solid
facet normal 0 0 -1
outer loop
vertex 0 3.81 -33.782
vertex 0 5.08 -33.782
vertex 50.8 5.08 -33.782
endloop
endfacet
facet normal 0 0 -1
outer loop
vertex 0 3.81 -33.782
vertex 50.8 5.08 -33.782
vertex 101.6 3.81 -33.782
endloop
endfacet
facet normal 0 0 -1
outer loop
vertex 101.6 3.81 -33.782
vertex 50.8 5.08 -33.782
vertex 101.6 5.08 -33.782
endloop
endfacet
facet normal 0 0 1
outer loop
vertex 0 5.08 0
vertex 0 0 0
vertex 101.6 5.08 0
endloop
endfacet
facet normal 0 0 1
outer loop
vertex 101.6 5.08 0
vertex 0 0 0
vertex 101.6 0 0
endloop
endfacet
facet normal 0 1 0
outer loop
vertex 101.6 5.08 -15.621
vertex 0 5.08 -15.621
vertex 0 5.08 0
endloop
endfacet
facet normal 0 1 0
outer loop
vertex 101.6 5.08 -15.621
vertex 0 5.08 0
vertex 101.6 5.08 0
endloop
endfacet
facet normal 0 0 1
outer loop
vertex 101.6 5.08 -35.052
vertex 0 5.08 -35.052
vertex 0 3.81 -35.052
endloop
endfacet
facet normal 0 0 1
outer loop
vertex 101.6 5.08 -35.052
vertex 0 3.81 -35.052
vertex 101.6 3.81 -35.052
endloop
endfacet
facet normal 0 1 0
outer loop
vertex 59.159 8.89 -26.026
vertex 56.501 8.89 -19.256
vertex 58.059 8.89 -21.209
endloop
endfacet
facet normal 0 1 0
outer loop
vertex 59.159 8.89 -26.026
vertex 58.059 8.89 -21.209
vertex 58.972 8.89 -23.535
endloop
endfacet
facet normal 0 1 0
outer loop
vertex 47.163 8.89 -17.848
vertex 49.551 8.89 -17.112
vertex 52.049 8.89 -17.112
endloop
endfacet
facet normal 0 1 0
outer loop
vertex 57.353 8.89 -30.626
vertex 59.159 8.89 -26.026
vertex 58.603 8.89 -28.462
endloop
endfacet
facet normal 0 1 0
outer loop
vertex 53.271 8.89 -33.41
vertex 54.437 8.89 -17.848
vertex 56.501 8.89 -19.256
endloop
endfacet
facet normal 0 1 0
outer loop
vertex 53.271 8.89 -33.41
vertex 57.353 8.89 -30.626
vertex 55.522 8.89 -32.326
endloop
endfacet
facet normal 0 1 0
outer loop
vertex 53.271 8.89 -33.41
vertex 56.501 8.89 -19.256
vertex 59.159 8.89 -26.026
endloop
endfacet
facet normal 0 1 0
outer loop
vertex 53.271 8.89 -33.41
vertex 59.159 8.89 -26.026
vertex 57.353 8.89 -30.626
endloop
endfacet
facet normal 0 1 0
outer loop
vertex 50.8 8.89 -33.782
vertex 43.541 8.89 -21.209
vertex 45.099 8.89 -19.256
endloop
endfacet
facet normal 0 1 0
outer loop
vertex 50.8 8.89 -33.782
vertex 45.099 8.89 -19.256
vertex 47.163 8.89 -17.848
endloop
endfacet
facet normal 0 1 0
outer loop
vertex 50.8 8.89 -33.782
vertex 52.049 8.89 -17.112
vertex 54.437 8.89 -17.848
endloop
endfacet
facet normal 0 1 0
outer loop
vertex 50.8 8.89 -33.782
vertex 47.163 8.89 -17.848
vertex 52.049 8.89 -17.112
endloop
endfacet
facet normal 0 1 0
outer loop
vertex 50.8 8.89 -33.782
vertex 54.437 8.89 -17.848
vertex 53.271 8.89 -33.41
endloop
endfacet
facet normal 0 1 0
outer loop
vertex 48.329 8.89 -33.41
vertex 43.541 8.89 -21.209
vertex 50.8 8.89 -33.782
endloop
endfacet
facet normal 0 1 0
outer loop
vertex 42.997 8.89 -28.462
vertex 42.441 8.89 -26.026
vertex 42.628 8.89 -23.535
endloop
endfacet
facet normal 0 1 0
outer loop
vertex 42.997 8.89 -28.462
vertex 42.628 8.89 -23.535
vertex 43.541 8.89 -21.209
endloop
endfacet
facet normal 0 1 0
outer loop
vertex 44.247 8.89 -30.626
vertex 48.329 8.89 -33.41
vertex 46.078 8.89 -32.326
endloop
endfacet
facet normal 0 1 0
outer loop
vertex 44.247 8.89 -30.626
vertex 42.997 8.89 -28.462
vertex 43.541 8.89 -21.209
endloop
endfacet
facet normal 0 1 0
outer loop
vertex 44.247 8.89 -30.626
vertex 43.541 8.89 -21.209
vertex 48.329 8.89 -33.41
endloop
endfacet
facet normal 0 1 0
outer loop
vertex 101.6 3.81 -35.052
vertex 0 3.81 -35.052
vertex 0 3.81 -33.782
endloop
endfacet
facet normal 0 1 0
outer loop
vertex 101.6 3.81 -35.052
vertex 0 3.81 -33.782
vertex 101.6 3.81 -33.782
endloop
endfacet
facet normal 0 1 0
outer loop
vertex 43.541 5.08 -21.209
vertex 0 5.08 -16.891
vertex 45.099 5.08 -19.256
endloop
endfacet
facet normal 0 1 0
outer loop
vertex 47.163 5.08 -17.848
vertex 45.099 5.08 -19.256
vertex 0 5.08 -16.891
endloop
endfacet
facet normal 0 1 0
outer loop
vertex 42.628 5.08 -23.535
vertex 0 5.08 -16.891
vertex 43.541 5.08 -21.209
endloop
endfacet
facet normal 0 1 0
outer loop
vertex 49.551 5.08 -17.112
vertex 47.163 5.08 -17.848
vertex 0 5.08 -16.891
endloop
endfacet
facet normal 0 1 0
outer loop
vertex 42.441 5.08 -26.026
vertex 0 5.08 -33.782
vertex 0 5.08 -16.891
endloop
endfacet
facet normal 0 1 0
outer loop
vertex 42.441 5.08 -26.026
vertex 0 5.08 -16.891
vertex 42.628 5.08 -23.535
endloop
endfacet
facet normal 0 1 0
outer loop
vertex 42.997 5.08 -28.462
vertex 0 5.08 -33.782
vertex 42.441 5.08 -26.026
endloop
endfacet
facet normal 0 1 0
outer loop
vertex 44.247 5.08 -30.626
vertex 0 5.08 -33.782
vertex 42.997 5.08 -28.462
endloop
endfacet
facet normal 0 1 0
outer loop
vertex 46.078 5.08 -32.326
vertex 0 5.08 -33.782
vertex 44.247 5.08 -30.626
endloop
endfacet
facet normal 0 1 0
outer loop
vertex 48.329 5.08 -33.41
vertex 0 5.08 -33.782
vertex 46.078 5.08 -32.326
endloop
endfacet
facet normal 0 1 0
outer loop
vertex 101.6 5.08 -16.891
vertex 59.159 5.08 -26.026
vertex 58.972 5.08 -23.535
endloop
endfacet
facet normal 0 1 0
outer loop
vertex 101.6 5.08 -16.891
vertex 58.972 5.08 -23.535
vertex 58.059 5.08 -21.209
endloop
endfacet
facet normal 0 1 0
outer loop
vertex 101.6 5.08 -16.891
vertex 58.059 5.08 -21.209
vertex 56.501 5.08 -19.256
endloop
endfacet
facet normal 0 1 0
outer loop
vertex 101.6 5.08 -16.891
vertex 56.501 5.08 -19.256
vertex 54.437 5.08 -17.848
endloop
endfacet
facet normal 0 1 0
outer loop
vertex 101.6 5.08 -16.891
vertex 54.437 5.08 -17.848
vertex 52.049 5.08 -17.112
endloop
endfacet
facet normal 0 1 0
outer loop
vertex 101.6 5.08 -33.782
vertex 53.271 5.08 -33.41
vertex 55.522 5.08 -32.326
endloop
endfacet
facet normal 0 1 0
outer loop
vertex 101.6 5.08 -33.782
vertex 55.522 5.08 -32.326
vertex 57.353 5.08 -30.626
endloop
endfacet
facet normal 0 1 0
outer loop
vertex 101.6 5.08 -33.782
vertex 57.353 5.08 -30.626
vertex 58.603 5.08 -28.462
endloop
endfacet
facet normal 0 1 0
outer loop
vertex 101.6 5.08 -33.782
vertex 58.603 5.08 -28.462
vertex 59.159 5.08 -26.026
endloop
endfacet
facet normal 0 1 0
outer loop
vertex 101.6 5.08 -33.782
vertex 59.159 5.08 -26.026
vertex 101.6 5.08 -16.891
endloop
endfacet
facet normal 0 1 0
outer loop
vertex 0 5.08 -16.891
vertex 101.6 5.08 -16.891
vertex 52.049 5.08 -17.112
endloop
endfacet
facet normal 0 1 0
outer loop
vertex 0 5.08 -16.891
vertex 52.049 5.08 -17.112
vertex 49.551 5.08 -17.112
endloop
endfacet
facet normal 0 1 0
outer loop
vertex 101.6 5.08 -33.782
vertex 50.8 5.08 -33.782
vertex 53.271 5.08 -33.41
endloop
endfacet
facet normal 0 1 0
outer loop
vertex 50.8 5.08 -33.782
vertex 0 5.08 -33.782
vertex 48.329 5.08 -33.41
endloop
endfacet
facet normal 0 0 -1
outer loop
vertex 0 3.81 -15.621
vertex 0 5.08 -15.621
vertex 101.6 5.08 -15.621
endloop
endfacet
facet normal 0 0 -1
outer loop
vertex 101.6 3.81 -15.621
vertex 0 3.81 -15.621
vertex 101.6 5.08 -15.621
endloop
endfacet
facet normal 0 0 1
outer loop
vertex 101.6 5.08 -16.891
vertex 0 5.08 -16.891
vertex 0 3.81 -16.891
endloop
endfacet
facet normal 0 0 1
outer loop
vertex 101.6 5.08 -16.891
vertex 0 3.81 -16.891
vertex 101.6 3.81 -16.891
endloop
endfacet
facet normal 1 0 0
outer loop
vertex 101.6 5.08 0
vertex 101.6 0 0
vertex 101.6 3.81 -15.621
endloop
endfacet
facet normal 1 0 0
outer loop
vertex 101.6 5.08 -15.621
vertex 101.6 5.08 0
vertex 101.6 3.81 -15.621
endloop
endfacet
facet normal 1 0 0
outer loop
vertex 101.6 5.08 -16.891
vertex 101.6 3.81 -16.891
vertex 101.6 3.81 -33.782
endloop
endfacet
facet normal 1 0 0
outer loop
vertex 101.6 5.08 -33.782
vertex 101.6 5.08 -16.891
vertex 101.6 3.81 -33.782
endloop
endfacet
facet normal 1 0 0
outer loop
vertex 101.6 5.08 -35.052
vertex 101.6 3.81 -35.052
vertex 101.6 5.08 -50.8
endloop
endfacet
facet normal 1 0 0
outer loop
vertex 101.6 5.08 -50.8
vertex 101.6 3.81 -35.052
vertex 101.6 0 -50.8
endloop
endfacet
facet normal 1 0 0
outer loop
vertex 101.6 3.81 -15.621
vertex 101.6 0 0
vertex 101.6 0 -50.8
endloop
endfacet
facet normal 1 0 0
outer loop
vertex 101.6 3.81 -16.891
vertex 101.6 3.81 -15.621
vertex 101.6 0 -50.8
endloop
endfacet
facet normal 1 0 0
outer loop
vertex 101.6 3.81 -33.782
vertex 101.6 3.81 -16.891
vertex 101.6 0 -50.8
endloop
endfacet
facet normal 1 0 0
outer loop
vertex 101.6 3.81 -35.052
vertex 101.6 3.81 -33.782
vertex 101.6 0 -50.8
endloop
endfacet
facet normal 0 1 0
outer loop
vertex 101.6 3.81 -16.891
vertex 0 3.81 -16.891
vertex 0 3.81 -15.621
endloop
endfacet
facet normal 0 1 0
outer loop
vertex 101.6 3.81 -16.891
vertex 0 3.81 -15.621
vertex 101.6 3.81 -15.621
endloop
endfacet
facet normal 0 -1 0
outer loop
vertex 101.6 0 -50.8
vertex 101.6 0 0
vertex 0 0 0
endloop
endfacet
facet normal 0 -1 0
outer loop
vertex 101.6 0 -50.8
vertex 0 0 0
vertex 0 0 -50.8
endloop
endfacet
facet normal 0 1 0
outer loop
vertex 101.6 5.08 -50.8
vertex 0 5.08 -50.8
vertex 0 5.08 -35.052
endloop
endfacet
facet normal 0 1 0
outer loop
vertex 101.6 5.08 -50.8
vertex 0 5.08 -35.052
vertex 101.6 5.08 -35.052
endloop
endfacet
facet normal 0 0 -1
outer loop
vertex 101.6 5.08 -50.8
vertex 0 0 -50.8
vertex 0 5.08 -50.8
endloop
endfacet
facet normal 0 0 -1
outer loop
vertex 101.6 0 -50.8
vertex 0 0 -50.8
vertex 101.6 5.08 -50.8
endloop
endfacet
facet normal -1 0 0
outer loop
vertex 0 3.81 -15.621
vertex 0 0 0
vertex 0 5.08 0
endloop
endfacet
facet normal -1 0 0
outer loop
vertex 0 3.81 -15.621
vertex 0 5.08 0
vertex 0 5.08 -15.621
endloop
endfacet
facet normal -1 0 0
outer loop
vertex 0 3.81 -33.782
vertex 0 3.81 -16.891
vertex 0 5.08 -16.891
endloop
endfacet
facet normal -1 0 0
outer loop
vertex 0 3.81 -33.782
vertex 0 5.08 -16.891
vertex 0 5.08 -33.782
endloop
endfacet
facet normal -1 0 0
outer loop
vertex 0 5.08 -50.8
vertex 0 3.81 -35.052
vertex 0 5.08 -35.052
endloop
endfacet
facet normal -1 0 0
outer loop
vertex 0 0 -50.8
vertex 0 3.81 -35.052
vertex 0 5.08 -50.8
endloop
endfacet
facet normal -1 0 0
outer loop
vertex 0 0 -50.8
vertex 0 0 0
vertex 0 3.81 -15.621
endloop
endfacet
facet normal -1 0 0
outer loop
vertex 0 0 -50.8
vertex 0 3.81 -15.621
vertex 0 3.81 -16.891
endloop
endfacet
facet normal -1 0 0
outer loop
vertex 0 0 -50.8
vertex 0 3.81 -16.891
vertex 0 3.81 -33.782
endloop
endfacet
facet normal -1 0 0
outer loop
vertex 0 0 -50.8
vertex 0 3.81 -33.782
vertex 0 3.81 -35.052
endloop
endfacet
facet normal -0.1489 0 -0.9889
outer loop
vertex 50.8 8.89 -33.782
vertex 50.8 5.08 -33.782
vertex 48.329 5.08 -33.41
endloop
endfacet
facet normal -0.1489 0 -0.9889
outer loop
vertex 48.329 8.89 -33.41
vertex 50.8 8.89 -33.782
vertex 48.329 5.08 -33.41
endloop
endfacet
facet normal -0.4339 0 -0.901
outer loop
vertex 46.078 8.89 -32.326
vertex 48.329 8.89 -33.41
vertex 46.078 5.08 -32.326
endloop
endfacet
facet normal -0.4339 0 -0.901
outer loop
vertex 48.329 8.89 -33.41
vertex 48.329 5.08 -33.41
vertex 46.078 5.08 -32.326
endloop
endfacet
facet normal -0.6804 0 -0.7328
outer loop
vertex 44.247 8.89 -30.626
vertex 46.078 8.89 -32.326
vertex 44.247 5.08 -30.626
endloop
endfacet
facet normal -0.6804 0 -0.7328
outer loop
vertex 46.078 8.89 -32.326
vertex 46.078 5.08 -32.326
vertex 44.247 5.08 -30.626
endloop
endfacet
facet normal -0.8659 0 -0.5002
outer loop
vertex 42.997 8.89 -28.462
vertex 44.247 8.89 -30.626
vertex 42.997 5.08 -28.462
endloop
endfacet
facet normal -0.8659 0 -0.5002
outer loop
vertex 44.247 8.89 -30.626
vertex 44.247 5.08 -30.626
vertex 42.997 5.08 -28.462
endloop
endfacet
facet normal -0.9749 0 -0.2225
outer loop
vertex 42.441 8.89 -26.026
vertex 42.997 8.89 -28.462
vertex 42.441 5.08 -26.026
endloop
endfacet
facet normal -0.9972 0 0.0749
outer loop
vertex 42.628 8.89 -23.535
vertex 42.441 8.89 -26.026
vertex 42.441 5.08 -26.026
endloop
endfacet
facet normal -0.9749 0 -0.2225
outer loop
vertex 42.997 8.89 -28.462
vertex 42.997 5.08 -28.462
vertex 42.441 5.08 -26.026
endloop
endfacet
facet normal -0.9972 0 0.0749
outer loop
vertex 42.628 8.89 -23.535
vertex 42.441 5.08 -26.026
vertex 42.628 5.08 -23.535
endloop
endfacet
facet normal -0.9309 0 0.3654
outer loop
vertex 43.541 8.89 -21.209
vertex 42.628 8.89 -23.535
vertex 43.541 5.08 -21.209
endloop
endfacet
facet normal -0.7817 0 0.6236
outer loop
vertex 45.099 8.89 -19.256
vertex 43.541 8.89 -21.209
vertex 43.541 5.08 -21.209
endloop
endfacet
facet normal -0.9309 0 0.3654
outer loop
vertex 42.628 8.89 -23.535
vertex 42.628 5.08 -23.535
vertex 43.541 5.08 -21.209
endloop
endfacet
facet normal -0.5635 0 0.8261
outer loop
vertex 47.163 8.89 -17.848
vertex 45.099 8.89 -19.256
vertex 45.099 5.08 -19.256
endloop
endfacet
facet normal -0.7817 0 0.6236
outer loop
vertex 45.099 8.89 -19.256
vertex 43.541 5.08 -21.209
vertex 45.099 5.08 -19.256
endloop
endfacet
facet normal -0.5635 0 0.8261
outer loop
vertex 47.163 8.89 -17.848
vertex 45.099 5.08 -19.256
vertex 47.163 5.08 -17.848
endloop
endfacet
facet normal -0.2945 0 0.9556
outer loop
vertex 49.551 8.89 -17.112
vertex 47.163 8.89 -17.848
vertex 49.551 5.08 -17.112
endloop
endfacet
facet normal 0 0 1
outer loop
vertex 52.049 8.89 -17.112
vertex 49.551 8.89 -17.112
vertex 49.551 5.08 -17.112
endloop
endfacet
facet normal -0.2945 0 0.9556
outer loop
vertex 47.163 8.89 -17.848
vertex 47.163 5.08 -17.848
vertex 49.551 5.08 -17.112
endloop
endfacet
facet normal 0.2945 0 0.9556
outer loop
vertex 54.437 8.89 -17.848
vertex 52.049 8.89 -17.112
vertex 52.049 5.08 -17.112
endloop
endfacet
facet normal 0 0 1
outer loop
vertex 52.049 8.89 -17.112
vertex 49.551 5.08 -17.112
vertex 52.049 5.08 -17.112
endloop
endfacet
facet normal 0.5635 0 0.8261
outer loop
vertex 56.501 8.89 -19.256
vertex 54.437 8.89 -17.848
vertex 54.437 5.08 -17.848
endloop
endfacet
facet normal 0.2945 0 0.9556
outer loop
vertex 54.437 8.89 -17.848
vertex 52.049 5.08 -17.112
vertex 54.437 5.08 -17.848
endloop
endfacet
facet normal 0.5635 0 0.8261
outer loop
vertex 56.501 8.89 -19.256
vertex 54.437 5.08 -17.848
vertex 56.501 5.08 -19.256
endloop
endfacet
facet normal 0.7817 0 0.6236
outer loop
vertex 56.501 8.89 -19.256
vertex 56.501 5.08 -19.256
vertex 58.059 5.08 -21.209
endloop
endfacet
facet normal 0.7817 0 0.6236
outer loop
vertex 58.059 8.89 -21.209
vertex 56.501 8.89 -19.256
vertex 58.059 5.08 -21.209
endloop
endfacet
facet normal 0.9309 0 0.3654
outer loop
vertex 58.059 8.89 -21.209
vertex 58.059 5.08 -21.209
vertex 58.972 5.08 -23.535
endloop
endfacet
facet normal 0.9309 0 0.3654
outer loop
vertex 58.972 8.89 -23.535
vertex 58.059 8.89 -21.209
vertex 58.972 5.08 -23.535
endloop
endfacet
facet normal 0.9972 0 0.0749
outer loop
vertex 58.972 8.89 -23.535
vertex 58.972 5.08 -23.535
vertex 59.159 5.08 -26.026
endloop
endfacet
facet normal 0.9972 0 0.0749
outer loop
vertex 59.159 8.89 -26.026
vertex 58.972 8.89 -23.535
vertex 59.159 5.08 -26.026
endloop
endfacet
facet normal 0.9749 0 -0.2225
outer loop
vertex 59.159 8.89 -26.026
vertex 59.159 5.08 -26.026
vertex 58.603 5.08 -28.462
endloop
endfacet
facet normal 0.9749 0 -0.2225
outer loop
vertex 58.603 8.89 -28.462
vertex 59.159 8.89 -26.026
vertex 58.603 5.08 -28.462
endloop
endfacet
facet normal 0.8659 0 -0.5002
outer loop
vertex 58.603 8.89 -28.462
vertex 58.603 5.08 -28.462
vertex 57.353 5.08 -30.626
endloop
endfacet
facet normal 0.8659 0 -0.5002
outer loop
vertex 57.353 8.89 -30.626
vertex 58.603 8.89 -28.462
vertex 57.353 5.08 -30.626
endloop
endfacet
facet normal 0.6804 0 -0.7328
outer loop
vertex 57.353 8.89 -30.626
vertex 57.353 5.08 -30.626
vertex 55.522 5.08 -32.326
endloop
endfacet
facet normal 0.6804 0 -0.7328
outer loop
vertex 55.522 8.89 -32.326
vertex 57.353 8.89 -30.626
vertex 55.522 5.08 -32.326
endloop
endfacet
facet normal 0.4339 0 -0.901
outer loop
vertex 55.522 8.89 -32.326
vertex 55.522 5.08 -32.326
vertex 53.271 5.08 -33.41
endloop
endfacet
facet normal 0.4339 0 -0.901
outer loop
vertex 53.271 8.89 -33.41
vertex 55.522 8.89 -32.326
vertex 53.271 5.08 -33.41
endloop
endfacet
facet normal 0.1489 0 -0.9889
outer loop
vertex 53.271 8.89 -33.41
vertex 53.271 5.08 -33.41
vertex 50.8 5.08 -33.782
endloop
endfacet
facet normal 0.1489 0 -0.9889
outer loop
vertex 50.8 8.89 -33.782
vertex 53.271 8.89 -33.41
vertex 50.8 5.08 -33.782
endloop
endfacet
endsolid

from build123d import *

# Parameters (mm, degrees)
SKETCH1_W           = 101.6
SKETCH1_H           = 50.8
BOSS_EXTRUDE1_DEPTH = 5.08
SKETCH2_R           = 8.382
BOSS_EXTRUDE2_DEPTH = 8.89
SKETCH4_W           = 101.6
SKETCH4_H           = 1.27
CUT_EXTRUDE1_DEPTH  = 1.27
SKETCH5_W           = 101.6
SKETCH5_H           = 1.27
CUT_EXTRUDE2_DEPTH  = 1.27


with BuildPart() as part:
    # Sketch1 → Boss-Extrude1 (new body)
    with BuildSketch(Plane(origin=(0, 0, 0), x_dir=(1, 0, 0), z_dir=(0, 1, 0))):
        with Locations((50.8, 25.4)):
            Rectangle(SKETCH1_W, SKETCH1_H)
    extrude(amount=BOSS_EXTRUDE1_DEPTH)

    # Sketch2 → Boss-Extrude2 (add)
    with BuildSketch(Plane(origin=(0, 0, 0), x_dir=(1, 0, 0), z_dir=(0, 1, 0))):
        with Locations(Location((50.8, 25.4, 0), (0, 0, 90))):
            Circle(SKETCH2_R)
    extrude(amount=BOSS_EXTRUDE2_DEPTH)

    # Sketch4 → Cut-Extrude1 (cut)
    with BuildSketch(Plane(origin=(0, 5.08, 0), x_dir=(1, 0, 0), z_dir=(0, 1, 0))):
        with Locations((50.8, 34.417)):
            Rectangle(SKETCH4_W, SKETCH4_H)
    extrude(amount=-CUT_EXTRUDE1_DEPTH, mode=Mode.SUBTRACT)

    # Sketch5 → Cut-Extrude2 (cut)
    with BuildSketch(Plane(origin=(0, 5.08, 0), x_dir=(1, 0, 0), z_dir=(0, 1, 0))):
        with Locations((50.8, 16.256)):
            Rectangle(SKETCH5_W, SKETCH5_H)
    extrude(amount=-CUT_EXTRUDE2_DEPTH, mode=Mode.SUBTRACT)


solid = part.part
